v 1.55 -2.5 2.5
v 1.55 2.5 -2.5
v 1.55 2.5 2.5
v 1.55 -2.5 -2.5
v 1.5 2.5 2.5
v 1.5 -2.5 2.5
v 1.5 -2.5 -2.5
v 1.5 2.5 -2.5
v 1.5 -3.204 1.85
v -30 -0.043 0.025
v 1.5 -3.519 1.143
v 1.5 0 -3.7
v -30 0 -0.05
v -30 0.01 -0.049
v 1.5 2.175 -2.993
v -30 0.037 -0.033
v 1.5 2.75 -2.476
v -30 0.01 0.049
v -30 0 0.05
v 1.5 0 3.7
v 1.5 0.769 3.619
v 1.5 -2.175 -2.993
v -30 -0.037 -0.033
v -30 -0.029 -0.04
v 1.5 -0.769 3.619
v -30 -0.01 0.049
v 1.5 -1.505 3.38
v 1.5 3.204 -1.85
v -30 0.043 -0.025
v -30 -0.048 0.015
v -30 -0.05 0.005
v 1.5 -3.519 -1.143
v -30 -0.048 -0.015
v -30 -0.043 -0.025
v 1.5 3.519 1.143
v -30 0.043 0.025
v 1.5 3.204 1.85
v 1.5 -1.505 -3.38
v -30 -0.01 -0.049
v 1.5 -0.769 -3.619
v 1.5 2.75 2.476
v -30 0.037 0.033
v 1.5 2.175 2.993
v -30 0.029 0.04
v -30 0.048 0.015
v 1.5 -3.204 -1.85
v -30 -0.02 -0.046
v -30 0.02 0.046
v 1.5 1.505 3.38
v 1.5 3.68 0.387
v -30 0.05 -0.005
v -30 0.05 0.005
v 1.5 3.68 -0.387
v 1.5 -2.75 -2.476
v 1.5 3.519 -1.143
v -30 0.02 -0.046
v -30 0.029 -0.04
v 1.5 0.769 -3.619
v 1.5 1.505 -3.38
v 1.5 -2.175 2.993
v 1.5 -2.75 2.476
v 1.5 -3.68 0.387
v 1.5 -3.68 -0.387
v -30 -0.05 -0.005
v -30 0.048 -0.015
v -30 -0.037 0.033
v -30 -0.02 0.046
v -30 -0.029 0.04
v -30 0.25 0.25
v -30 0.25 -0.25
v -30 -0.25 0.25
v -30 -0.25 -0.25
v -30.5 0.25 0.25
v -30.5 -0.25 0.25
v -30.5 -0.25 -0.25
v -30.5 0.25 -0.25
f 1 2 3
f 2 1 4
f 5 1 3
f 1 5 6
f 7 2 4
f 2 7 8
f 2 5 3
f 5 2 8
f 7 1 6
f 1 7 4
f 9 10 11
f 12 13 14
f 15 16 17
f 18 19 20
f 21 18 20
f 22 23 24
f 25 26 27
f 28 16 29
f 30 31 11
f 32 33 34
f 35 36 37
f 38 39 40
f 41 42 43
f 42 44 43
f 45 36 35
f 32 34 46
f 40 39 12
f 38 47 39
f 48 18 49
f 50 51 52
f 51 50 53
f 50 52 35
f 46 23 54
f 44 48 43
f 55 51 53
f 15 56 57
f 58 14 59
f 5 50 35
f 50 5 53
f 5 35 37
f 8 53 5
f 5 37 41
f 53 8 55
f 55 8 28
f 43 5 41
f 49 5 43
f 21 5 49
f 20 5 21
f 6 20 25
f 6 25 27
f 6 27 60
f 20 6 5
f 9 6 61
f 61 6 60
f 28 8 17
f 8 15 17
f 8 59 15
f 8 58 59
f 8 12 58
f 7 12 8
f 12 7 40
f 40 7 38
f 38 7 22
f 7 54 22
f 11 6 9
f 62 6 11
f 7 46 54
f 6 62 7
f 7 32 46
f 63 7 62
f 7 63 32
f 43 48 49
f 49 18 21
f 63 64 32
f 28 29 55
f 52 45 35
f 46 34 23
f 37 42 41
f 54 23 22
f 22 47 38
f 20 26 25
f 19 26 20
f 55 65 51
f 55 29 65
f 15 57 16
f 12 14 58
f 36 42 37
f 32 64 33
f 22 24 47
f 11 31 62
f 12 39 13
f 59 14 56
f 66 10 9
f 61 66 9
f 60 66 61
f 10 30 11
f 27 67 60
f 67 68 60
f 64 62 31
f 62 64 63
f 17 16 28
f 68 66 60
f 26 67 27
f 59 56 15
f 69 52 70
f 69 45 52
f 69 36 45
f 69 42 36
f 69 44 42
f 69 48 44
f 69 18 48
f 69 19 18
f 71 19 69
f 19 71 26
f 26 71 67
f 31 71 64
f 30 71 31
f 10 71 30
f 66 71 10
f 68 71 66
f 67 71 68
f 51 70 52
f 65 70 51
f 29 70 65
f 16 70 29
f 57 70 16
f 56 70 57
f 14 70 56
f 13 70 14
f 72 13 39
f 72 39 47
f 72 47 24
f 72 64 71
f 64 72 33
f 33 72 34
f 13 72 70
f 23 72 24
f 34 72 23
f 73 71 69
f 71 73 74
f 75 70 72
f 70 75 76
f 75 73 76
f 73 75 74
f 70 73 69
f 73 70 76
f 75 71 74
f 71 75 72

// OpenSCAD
//linear_extrude(height = 5, center = true, convexity = 10, slices = 20, scale = 1.0, $fn = 16);

//Parafuso
color("lightgray", 1.0)
linear_extrude(height = 4, center = true, twist = -700, $fn = 30)
rotate([0,55,0]) 
translate([1, 0, 0]) 
circle(r = 0.5);

//Detetor
color("darkgray", 1.0)
translate([1.5,0,0]) {
    cube([0.1,5.0,5.0],true);
}

////Feixe de raios X
color("LightYellow", 0.25)
translate([1.5,0,0])
rotate([0,-90,0])
cylinder(h=31.5, r2 = 0.05, r1 = 3.7, $fn = 30);

//Divergência (panqueca)
translate([-30.0, 0, 0]) 
rotate([0,90,0])
cylinder(h=0.001, r = 0.05, $fn = 30);

//Fonte
color("cyan", 1.0)
translate([-30.25,0,0]) {
    cube([0.5,0.5,0.5],true);
}
